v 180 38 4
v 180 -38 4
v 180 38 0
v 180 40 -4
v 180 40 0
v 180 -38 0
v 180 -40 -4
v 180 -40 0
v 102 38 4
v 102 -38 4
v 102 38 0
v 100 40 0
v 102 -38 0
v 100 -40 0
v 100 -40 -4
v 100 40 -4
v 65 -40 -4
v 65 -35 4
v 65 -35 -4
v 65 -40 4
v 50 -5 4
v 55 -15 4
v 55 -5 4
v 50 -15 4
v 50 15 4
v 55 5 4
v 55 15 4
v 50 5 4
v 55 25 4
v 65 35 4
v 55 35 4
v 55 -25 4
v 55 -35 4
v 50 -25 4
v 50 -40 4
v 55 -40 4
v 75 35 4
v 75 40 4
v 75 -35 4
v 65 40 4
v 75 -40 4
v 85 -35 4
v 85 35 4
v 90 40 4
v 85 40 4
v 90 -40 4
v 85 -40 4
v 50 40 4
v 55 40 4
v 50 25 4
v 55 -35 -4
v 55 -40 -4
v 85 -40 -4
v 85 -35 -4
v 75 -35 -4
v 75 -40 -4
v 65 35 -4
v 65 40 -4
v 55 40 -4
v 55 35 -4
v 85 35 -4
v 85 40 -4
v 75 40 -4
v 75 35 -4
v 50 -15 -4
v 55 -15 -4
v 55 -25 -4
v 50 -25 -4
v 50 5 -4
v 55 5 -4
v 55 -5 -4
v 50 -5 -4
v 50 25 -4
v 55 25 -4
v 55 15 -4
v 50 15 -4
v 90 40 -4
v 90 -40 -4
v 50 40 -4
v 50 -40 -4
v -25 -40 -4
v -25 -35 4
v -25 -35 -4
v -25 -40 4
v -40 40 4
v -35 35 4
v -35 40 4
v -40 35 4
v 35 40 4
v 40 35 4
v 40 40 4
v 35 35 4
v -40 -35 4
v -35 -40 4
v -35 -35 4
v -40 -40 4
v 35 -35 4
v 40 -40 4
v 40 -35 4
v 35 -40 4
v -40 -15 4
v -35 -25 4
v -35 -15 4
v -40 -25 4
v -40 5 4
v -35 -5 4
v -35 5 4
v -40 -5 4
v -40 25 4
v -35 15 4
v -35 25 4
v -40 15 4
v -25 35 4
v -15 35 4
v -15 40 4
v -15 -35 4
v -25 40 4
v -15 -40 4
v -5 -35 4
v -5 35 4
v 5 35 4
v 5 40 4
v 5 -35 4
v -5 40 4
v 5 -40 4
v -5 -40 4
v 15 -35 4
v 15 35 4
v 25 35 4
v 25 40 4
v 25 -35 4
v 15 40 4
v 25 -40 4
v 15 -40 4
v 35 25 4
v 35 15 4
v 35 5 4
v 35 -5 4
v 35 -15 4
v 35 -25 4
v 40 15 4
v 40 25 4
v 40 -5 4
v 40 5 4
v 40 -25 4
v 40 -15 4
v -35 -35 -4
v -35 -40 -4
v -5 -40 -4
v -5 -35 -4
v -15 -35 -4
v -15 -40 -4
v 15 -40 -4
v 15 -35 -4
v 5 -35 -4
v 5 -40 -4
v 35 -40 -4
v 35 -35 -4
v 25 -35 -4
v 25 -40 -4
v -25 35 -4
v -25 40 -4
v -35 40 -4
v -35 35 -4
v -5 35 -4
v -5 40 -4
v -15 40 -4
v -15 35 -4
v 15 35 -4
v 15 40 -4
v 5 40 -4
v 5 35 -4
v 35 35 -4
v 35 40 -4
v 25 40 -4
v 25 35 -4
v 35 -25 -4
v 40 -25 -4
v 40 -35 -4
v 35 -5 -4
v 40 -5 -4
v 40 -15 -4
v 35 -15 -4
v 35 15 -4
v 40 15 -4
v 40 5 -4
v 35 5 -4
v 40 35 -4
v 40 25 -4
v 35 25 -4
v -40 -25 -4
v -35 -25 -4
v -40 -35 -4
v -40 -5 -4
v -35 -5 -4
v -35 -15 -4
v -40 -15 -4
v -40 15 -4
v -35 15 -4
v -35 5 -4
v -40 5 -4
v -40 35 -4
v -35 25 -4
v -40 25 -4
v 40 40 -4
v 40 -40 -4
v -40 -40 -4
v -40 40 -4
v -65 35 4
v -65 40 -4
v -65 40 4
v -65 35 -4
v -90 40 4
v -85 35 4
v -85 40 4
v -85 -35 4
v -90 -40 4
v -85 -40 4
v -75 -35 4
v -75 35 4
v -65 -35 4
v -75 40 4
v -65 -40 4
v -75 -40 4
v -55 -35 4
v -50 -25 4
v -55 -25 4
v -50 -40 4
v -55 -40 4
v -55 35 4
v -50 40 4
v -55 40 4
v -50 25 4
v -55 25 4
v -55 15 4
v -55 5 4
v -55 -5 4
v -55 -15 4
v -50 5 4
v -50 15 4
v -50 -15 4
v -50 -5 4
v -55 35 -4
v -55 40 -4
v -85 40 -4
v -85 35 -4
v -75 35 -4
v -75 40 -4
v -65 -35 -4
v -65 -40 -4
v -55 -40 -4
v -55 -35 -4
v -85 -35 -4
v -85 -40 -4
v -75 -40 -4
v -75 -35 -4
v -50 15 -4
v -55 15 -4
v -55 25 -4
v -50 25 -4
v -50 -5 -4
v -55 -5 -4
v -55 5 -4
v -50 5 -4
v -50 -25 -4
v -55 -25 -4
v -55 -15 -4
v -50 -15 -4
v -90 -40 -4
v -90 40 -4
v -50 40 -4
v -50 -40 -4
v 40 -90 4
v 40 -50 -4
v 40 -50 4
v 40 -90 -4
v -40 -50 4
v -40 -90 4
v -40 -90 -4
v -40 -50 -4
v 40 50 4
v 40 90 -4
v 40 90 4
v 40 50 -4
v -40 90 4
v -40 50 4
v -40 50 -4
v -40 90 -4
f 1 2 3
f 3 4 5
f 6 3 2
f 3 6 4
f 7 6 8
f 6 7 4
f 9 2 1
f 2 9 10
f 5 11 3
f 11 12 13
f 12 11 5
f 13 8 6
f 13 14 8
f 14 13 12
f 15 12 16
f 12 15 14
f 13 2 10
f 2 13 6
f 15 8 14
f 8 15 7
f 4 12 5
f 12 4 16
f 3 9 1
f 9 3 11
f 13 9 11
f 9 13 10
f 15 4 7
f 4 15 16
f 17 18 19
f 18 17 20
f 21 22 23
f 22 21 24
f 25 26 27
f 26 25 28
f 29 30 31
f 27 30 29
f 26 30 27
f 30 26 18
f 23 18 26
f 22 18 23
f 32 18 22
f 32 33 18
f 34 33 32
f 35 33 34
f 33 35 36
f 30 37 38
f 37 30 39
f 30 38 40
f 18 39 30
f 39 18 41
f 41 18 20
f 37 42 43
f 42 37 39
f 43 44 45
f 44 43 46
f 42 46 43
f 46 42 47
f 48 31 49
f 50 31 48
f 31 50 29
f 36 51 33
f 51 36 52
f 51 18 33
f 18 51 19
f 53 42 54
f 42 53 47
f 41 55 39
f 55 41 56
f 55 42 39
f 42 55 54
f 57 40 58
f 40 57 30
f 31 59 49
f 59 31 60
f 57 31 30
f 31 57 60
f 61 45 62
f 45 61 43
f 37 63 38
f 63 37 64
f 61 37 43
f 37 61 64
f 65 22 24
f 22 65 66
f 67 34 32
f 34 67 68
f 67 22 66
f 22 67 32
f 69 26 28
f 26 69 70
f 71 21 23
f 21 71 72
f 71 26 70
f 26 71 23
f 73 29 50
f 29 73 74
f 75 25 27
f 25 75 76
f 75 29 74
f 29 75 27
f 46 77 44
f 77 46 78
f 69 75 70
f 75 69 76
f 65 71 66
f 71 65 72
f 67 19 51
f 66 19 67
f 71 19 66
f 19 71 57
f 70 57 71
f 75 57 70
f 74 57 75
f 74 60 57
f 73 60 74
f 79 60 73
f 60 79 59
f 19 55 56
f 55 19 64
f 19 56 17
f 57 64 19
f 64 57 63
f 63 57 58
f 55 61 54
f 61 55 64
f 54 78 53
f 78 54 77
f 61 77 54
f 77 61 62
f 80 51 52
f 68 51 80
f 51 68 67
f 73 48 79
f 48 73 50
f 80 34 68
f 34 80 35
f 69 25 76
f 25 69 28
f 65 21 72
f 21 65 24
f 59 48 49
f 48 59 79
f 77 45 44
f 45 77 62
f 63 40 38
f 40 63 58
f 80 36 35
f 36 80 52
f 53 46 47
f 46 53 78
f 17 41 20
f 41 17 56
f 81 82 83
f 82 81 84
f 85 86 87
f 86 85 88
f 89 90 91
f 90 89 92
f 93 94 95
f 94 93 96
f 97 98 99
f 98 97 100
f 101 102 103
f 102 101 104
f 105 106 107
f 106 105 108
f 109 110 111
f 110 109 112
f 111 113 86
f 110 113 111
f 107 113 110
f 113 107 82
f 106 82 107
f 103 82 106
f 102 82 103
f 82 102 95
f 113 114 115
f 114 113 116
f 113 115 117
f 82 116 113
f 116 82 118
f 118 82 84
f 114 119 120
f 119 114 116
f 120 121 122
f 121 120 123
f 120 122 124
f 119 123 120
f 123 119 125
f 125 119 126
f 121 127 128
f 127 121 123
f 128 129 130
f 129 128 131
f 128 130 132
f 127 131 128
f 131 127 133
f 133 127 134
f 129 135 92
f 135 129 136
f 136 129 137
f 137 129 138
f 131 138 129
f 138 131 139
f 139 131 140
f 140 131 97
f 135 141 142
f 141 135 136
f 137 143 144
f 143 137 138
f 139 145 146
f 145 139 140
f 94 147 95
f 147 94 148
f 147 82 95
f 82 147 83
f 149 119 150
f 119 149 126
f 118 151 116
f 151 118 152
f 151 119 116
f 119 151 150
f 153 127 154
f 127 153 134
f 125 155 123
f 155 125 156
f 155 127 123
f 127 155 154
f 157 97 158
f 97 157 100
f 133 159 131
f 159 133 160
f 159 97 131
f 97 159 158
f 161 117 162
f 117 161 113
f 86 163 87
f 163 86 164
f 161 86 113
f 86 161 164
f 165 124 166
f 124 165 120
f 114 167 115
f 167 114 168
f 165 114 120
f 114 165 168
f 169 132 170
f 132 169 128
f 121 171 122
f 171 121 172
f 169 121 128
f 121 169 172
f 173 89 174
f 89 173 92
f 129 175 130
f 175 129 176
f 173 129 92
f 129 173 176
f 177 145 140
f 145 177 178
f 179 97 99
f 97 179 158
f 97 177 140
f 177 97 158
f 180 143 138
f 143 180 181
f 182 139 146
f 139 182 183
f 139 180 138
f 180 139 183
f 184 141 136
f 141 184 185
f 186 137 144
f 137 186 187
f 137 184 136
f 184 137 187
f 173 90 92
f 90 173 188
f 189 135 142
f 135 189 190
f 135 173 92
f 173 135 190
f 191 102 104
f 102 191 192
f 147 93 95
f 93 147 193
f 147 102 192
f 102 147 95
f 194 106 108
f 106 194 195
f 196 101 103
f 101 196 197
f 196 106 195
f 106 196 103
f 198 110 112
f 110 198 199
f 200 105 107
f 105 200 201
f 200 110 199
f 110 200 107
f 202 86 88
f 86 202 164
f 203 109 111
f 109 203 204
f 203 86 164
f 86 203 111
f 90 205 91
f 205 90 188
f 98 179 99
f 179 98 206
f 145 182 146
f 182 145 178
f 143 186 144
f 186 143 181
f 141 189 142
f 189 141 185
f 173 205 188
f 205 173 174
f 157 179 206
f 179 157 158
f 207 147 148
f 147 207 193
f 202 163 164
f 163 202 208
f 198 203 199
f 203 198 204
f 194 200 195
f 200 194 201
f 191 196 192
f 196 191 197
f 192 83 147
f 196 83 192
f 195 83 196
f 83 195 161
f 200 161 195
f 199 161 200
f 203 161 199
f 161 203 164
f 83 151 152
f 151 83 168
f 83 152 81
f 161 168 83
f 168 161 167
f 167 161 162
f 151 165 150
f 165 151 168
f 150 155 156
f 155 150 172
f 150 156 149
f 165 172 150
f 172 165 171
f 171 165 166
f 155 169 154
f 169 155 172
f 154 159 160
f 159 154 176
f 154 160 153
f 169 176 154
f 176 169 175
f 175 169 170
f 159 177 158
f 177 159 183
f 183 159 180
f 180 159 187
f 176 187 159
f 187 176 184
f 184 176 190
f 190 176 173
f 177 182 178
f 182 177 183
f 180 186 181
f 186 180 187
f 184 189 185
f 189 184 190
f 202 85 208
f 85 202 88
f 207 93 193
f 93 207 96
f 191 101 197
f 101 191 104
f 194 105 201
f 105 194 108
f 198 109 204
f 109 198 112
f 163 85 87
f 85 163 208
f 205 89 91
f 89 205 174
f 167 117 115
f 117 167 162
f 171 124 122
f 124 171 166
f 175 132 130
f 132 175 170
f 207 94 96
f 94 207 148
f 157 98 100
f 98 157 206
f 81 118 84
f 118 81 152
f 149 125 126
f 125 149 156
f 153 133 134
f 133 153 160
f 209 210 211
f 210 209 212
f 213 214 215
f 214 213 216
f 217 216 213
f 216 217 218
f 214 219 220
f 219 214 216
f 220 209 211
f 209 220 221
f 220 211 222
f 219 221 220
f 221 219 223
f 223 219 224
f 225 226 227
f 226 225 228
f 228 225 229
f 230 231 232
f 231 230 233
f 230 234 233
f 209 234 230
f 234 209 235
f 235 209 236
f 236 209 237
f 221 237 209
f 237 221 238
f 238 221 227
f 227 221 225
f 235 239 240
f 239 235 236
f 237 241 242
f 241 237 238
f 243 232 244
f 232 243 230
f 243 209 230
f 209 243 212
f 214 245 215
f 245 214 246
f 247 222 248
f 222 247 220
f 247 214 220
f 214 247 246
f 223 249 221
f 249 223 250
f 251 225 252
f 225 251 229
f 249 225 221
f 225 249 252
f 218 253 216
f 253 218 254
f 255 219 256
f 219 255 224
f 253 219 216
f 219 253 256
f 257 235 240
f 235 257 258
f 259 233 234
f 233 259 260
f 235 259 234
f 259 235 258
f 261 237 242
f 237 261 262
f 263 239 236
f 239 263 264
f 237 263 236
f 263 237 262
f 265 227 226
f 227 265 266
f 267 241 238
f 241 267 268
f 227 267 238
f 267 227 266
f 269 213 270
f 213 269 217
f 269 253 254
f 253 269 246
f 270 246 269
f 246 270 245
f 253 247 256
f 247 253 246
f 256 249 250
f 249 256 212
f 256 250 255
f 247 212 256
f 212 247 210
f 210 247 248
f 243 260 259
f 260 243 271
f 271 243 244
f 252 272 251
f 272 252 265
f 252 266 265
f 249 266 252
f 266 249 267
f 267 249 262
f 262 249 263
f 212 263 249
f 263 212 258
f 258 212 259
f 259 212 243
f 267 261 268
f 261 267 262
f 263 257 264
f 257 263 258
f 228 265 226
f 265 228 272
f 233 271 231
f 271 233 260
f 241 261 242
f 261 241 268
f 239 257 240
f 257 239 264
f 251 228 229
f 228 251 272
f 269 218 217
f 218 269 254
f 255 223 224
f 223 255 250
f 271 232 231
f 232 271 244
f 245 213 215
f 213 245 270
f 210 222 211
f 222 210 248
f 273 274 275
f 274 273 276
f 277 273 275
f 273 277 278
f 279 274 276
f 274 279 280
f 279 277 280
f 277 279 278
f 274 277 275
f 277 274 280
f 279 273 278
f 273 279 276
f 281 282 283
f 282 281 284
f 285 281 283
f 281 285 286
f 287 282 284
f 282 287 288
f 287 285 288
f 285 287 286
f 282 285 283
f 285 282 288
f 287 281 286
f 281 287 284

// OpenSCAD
$fn=200;

cm=10;
mm=1;

thickness=8*mm;
sideW=8*cm;
sideH=4*cm;

topBottomW=8*cm;
topBottomL=8*cm;

tabMaxWidth=1*cm;
tabMinWidth=1*cm;
tabDepth=1*cm;

partSeparation=5*mm;

notchDepth=2*mm;
notchThickness=4*mm;

module topBottomBase(){
  cube(size=[topBottomW,topBottomL,thickness],center=true);
}

module topNotches(){
  union(){
    translate([0,-topBottomL/2+notchDepth/2,thickness-notchThickness*1.5])
      cube(size=[topBottomW,notchDepth,notchThickness], center=true);
    translate([0,topBottomL/2-notchDepth/2,thickness-notchThickness*1.5])
      cube(size=[topBottomW,notchDepth,notchThickness], center=true);
    translate([-topBottomW/2+notchDepth/2,0,thickness-notchThickness*1.5])
      cube(size=[notchDepth,topBottomW,notchThickness], center=true);
  }
}

module top(){
  difference(){
    topBottomBase();
    topNotches();
  }
}

module joint(length, offset=0){
  tabs = length/tabMaxWidth - offset;
  translate([-length/2+offset*tabMaxWidth,0,0])
    union(){
      for(i=[1:tabs]){
        translate([i*tabMaxWidth*2 + (tabMaxWidth),0,-thickness*0.25])
          cube(size=[tabMaxWidth,tabDepth,thickness*1.5],center=true);
      }
    }
}

module bottomJoints(){
  union(){
    translate([-topBottomW/2,-topBottomL/2,0]) joint(length=topBottomL/2);
    translate([-topBottomW/2,topBottomL/2,0]) joint(length=topBottomL/2);
    rotate([0,0,90]) translate([-topBottomL/2,-topBottomW/2,0]) joint(length=topBottomW/2);
    rotate([0,0,90]) translate([-topBottomL/2,topBottomW/2,0]) joint(length=topBottomW/2);
  }
}

module bottom(){
  difference(){
    topBottomBase();
    bottomJoints();
  }
}

module fbJoints(){
  union(){
    translate([-sideH/2-tabMaxWidth,-sideW/2,0]) joint(length=sideH/2, offset=0);
    translate([-sideH/2-tabMaxWidth,sideW/2,0]) joint(length=sideH/2, offset=0);
    rotate([0,0,90]) translate([-(sideW/2),sideH/2,0]) joint(length=sideW/2, offset=1);
  }
}

module frontBack(){
  difference(){
    cube(size=[sideH,sideW,thickness],center=true);
    fbJoints();
  }
}

module sideJoints(){
  union(){
  }
}

module side(){
  difference(){
    cube(size=[sideW,sideH,thickness],center=true);
    sideJoints();
  }
}

module assembly(){
  union(){
    translate([4*partSeparation + sideH + topBottomL,0,0]) top();
    translate([2*partSeparation + sideH/2 + topBottomL/2,0,0]) frontBack();
    bottom();
    translate([-(partSeparation*2 + sideH/2 + topBottomL/2),0,0])
      rotate([0,0,180])
        frontBack();

    translate([0,-(partSeparation*2 + topBottomW/2 + sideH/2),0]) side();
    translate([0,(partSeparation*2 + topBottomW/2 + sideH/2),0]) side();
  }
}

//bottomJoints();
assembly();
    
